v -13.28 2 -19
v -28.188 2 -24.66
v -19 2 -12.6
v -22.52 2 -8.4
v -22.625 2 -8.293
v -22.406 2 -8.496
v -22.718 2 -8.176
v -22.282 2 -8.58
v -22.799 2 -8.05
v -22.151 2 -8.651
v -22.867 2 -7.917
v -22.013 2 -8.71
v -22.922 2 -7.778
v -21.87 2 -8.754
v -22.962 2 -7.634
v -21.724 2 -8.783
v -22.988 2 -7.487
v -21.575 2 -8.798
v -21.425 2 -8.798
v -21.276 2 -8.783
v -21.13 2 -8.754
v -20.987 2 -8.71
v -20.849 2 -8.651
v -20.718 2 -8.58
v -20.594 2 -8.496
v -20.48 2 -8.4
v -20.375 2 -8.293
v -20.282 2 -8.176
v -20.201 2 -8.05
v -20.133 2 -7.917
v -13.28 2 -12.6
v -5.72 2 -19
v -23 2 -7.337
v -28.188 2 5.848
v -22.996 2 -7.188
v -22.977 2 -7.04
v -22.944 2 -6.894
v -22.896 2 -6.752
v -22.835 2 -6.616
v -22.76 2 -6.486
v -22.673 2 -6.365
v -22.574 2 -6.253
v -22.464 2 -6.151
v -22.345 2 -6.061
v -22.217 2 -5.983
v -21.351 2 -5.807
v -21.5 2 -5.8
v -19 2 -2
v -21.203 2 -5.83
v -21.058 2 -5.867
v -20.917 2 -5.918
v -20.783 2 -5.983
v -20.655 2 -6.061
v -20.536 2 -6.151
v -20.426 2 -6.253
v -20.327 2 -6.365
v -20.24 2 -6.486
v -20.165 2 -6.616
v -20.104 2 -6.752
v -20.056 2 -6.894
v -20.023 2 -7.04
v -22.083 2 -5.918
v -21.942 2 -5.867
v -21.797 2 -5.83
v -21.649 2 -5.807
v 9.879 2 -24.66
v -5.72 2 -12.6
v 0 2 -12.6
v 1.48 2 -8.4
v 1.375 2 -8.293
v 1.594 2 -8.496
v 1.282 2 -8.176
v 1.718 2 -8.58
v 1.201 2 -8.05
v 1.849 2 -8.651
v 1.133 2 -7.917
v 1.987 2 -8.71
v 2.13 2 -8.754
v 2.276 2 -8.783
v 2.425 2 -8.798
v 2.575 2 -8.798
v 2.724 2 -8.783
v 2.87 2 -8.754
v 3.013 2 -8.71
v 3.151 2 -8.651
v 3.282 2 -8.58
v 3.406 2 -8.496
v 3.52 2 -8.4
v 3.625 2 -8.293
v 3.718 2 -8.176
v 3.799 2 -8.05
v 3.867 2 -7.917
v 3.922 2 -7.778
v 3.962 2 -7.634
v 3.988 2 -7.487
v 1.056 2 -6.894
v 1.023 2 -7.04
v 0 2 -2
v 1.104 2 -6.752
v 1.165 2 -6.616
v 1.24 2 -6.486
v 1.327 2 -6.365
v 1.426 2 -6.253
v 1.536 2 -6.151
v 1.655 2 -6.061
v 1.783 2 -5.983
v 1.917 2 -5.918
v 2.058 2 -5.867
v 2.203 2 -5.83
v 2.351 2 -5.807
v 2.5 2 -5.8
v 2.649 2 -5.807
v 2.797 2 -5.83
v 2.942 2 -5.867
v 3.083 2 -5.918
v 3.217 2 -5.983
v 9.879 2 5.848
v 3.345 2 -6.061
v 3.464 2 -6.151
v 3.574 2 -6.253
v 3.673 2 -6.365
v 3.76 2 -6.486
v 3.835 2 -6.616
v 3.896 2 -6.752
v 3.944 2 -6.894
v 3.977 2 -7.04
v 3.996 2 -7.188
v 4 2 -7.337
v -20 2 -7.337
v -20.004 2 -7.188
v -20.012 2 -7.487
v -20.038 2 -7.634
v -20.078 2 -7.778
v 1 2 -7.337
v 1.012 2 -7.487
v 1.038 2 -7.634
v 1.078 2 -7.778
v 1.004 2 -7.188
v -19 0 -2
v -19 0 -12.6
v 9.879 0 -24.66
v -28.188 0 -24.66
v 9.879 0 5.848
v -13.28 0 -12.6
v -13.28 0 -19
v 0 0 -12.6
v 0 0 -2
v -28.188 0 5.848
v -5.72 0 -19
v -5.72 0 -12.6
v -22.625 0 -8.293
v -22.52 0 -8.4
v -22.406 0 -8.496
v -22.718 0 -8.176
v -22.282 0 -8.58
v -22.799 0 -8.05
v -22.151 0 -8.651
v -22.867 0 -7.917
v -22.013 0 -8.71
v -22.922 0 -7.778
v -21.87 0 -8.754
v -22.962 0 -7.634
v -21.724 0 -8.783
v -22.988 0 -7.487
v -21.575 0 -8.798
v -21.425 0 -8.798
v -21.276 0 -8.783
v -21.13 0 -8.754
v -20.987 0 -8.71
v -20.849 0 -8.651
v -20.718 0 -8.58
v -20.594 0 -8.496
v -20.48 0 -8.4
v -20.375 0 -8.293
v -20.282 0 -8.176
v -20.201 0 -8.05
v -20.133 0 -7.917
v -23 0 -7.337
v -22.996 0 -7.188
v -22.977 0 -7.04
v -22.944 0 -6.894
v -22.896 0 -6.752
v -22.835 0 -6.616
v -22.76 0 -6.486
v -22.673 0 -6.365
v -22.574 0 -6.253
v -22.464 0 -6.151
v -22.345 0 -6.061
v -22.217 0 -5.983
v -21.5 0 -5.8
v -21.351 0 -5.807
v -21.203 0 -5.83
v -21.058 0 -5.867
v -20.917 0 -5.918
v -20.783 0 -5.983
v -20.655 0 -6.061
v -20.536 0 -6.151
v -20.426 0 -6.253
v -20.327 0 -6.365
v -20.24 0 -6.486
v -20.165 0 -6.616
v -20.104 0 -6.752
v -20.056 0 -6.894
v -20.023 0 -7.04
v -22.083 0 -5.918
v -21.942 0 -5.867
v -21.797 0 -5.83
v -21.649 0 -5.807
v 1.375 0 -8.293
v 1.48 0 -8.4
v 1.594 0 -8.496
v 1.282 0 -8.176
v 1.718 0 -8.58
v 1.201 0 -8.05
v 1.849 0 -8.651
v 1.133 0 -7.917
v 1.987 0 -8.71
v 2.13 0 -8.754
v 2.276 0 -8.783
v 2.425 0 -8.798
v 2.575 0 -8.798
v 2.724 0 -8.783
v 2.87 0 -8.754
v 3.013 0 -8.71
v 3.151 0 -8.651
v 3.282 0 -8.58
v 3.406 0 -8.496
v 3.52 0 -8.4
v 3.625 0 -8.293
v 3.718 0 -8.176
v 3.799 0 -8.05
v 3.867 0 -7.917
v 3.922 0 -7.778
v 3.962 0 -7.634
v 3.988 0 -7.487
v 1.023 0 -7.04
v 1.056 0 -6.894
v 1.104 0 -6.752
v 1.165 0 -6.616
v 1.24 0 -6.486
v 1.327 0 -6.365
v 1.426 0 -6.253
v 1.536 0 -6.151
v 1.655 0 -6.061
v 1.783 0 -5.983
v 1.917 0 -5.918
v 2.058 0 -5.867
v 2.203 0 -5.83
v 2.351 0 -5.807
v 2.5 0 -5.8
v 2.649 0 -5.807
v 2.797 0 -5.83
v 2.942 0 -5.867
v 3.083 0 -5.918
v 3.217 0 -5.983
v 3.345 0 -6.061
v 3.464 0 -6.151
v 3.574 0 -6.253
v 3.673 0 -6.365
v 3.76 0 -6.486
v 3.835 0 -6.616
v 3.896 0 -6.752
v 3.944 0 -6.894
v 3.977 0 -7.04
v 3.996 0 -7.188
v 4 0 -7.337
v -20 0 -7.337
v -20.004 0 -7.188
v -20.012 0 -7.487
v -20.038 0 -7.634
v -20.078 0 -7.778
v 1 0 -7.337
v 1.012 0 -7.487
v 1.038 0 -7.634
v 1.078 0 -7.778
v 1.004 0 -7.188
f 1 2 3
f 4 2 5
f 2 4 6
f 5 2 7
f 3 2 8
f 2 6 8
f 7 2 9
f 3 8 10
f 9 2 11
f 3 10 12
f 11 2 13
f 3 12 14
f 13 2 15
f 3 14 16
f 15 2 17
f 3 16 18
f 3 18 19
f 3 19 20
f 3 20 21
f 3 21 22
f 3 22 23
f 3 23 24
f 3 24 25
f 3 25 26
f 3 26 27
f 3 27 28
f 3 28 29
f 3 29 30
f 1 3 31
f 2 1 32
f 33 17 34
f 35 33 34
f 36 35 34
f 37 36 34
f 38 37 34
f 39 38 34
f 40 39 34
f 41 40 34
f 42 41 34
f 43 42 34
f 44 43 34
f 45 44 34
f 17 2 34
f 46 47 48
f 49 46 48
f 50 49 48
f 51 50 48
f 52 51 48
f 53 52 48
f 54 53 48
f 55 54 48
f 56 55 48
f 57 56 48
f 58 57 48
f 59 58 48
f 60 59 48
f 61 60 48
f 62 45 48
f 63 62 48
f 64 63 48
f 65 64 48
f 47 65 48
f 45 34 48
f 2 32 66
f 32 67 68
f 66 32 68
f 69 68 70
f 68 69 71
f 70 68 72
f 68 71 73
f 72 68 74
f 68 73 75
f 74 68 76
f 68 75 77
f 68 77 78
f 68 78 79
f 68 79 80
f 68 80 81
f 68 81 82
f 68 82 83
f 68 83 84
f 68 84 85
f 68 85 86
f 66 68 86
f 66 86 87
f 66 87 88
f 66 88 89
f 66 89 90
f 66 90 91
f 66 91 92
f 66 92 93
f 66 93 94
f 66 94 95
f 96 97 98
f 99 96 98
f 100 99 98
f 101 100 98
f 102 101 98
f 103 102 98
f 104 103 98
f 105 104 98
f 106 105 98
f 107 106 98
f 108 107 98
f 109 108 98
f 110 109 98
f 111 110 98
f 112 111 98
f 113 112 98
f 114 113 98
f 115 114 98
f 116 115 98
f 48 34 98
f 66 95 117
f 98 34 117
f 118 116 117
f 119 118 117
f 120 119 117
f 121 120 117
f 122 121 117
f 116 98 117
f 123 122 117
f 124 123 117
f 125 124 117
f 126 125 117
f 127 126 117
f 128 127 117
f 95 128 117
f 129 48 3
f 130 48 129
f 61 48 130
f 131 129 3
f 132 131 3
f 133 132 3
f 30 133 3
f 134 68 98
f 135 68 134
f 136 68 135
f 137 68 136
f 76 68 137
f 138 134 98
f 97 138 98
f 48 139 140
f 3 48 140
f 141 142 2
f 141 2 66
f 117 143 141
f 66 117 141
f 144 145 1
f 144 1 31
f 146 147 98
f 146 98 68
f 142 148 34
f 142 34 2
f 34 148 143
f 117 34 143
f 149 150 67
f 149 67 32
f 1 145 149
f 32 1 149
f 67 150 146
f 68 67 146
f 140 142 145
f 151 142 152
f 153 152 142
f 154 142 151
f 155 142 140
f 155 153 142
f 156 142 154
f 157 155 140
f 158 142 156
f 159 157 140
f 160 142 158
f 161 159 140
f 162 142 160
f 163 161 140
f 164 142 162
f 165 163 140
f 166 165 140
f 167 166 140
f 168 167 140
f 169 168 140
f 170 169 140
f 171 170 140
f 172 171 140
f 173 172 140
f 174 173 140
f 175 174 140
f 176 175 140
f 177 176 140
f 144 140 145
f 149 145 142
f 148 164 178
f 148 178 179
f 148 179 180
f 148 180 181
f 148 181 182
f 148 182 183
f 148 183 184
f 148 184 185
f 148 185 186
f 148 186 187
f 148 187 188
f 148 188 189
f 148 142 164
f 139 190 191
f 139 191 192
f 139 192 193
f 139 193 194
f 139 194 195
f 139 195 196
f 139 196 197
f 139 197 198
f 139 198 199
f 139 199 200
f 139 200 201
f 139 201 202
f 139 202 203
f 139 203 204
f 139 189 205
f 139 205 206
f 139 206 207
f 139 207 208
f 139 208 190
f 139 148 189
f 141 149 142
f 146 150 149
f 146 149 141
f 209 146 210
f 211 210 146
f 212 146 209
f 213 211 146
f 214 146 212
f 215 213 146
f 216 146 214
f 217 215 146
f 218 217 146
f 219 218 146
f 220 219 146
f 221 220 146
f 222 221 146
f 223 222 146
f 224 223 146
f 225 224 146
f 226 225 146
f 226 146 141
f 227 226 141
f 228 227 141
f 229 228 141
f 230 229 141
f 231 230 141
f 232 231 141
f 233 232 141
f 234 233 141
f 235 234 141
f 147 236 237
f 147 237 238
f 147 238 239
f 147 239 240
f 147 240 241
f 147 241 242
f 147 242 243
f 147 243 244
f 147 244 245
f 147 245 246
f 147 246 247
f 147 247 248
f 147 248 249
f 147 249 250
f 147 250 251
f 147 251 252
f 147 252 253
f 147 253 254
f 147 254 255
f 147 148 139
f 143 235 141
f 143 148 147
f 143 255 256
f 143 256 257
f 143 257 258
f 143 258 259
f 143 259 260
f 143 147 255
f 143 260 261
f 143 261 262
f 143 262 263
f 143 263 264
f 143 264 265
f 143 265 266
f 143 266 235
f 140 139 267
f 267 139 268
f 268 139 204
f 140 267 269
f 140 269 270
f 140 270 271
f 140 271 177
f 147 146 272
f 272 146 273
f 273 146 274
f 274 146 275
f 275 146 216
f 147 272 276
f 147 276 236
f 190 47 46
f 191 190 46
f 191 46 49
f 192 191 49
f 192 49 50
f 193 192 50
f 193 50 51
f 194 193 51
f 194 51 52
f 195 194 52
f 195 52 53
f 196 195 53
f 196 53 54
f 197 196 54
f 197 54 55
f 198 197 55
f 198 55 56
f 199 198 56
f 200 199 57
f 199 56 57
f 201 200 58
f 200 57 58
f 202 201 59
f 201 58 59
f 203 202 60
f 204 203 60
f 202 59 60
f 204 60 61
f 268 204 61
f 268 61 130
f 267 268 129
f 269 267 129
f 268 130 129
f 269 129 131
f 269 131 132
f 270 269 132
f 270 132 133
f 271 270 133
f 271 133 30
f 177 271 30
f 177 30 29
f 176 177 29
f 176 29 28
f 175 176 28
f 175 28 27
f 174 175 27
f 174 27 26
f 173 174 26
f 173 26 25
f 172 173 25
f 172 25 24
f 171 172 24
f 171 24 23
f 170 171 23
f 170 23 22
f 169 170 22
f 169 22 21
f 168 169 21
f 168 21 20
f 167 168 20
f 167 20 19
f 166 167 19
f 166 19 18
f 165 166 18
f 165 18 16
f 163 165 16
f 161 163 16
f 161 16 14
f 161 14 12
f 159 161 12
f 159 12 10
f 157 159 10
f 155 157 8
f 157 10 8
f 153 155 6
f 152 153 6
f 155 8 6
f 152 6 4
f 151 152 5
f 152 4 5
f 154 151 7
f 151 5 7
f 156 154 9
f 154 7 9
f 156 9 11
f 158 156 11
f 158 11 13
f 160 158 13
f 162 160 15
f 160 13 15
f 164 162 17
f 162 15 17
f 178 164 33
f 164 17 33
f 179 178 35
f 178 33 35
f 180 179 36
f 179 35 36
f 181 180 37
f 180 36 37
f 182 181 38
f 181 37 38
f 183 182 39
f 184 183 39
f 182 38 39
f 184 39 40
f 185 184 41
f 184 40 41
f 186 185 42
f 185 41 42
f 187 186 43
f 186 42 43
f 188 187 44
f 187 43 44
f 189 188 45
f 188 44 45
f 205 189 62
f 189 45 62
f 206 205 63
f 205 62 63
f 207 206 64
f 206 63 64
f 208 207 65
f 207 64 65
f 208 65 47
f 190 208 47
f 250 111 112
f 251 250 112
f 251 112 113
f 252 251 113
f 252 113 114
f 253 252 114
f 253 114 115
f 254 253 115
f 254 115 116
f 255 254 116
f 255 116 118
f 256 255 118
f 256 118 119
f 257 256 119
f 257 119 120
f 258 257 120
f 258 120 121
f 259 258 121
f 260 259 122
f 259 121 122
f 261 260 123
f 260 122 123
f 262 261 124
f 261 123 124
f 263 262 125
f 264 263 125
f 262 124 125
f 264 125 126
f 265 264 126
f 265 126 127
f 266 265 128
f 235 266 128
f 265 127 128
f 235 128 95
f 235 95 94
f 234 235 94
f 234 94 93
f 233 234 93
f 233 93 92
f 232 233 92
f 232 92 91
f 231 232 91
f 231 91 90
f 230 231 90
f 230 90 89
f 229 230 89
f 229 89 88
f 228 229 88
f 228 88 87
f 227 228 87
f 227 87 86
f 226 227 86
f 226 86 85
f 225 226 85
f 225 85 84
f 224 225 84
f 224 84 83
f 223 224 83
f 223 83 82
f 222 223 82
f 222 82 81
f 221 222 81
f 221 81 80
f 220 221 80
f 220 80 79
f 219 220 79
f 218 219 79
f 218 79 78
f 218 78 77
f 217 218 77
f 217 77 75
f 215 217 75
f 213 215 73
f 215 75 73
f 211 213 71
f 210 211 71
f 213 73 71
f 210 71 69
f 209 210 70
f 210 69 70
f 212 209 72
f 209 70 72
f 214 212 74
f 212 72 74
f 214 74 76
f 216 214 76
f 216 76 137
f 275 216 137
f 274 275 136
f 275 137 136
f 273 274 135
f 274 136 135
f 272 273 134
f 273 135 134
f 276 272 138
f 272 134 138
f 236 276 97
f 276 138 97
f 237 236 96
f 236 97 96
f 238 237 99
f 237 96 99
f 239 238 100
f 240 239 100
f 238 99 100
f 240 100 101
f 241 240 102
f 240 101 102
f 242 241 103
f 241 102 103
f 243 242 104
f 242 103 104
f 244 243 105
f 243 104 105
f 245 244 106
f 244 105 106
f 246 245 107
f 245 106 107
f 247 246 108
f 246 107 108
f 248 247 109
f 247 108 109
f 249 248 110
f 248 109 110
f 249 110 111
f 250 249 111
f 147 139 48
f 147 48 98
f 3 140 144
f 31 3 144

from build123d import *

# Parameters (mm, degrees)
SKETCH1_W           = 38.06737889
SKETCH1_H           = 30.508545283
SKETCH1_R           = 1.5
SKETCH1_W_2         = 19
SKETCH1_H_2         = 19
SKETCH1_W_3         = 5.72
SKETCH1_H_3         = 4.4
BOSS_EXTRUDE1_DEPTH = 2
SKETCH2_W           = 5.72
SKETCH2_H           = 2
SKETCH2_W_2         = 19
BOSS_EXTRUDE2_DEPTH = 2
SKETCH4_W           = 5.306249276
SKETCH4_H           = 7.407734137
SKETCH4_W_2         = 4.41311821
SKETCH4_H_2         = 5.936694734
BOSS_EXTRUDE3_DEPTH = 2
SKETCH5_R           = 1.5
CUT_EXTRUDE1_DEPTH  = 10


with BuildPart() as part:
    # Sketch1 → Boss-Extrude1 (new body)
    # profile 1 of 3: a face of its own
    with BuildSketch(Plane(origin=(0, 0, 0), x_dir=(1, 0, 0), z_dir=(0, 1, 0))):
        with Locations((-9.154760873, 9.406137061)):
            Rectangle(SKETCH1_W, SKETCH1_H)
        with Locations(Location((-21.5, 7.875, 0), (0, 0, 270))):
            Circle(SKETCH1_R, mode=Mode.SUBTRACT)
        with Locations(Location((2.5, 7.875, 0), (0, 0, 270))):
            Circle(SKETCH1_R, mode=Mode.SUBTRACT)
        with Locations((-9.5, 9.5)):
            Rectangle(SKETCH1_W_2, SKETCH1_H_2, mode=Mode.SUBTRACT)
    # profile 2 of 3: a face of its own
    with BuildSketch(Plane(origin=(0, 0, 0), x_dir=(1, 0, 0), z_dir=(0, 1, 0))):
        with Locations((-16.14, 16.8)):
            Rectangle(SKETCH1_W_3, SKETCH1_H_3)
    # profile 3 of 3: a face of its own
    with BuildSketch(Plane(origin=(0, 0, 0), x_dir=(1, 0, 0), z_dir=(0, 1, 0))):
        with Locations((-2.86, 16.8)):
            Rectangle(SKETCH1_W_3, SKETCH1_H_3)
    extrude(amount=BOSS_EXTRUDE1_DEPTH)

    # Sketch2 → Boss-Extrude2 (add)
    with BuildSketch(Plane.XZ):
        with Locations((-16.14, -13.6)):
            Rectangle(SKETCH2_W, SKETCH2_H)
        with Locations((-2.86, -13.6)):
            Rectangle(SKETCH2_W, SKETCH2_H)
        with Locations((-9.5, -1)):
            Rectangle(SKETCH2_W_2, SKETCH2_H)
    extrude(amount=-BOSS_EXTRUDE2_DEPTH)

    # Sketch4 → Boss-Extrude3 (add)
    with BuildSketch(Plane(origin=(0, 2, 0), x_dir=(1, 0, 0), z_dir=(0, 1, 0))):
        with Locations((-22.157698454, 8.69688592)):
            Rectangle(SKETCH4_W, SKETCH4_H)
        with Locations((2.928777081, 8.329126069)):
            Rectangle(SKETCH4_W_2, SKETCH4_H_2)
    extrude(amount=-BOSS_EXTRUDE3_DEPTH)

    # Sketch5 → Cut-Extrude1 (cut)
    with BuildSketch(Plane(origin=(0, 2, 0), x_dir=(1, 0, 0), z_dir=(0, 1, 0))):
        with Locations(Location((-21.5, 7.3, 0), (0, 0, 270))):
            Circle(SKETCH5_R)
        with Locations(Location((2.5, 7.3, 0), (0, 0, 270))):
            Circle(SKETCH5_R)
    extrude(amount=-CUT_EXTRUDE1_DEPTH, mode=Mode.SUBTRACT)


solid = part.part
